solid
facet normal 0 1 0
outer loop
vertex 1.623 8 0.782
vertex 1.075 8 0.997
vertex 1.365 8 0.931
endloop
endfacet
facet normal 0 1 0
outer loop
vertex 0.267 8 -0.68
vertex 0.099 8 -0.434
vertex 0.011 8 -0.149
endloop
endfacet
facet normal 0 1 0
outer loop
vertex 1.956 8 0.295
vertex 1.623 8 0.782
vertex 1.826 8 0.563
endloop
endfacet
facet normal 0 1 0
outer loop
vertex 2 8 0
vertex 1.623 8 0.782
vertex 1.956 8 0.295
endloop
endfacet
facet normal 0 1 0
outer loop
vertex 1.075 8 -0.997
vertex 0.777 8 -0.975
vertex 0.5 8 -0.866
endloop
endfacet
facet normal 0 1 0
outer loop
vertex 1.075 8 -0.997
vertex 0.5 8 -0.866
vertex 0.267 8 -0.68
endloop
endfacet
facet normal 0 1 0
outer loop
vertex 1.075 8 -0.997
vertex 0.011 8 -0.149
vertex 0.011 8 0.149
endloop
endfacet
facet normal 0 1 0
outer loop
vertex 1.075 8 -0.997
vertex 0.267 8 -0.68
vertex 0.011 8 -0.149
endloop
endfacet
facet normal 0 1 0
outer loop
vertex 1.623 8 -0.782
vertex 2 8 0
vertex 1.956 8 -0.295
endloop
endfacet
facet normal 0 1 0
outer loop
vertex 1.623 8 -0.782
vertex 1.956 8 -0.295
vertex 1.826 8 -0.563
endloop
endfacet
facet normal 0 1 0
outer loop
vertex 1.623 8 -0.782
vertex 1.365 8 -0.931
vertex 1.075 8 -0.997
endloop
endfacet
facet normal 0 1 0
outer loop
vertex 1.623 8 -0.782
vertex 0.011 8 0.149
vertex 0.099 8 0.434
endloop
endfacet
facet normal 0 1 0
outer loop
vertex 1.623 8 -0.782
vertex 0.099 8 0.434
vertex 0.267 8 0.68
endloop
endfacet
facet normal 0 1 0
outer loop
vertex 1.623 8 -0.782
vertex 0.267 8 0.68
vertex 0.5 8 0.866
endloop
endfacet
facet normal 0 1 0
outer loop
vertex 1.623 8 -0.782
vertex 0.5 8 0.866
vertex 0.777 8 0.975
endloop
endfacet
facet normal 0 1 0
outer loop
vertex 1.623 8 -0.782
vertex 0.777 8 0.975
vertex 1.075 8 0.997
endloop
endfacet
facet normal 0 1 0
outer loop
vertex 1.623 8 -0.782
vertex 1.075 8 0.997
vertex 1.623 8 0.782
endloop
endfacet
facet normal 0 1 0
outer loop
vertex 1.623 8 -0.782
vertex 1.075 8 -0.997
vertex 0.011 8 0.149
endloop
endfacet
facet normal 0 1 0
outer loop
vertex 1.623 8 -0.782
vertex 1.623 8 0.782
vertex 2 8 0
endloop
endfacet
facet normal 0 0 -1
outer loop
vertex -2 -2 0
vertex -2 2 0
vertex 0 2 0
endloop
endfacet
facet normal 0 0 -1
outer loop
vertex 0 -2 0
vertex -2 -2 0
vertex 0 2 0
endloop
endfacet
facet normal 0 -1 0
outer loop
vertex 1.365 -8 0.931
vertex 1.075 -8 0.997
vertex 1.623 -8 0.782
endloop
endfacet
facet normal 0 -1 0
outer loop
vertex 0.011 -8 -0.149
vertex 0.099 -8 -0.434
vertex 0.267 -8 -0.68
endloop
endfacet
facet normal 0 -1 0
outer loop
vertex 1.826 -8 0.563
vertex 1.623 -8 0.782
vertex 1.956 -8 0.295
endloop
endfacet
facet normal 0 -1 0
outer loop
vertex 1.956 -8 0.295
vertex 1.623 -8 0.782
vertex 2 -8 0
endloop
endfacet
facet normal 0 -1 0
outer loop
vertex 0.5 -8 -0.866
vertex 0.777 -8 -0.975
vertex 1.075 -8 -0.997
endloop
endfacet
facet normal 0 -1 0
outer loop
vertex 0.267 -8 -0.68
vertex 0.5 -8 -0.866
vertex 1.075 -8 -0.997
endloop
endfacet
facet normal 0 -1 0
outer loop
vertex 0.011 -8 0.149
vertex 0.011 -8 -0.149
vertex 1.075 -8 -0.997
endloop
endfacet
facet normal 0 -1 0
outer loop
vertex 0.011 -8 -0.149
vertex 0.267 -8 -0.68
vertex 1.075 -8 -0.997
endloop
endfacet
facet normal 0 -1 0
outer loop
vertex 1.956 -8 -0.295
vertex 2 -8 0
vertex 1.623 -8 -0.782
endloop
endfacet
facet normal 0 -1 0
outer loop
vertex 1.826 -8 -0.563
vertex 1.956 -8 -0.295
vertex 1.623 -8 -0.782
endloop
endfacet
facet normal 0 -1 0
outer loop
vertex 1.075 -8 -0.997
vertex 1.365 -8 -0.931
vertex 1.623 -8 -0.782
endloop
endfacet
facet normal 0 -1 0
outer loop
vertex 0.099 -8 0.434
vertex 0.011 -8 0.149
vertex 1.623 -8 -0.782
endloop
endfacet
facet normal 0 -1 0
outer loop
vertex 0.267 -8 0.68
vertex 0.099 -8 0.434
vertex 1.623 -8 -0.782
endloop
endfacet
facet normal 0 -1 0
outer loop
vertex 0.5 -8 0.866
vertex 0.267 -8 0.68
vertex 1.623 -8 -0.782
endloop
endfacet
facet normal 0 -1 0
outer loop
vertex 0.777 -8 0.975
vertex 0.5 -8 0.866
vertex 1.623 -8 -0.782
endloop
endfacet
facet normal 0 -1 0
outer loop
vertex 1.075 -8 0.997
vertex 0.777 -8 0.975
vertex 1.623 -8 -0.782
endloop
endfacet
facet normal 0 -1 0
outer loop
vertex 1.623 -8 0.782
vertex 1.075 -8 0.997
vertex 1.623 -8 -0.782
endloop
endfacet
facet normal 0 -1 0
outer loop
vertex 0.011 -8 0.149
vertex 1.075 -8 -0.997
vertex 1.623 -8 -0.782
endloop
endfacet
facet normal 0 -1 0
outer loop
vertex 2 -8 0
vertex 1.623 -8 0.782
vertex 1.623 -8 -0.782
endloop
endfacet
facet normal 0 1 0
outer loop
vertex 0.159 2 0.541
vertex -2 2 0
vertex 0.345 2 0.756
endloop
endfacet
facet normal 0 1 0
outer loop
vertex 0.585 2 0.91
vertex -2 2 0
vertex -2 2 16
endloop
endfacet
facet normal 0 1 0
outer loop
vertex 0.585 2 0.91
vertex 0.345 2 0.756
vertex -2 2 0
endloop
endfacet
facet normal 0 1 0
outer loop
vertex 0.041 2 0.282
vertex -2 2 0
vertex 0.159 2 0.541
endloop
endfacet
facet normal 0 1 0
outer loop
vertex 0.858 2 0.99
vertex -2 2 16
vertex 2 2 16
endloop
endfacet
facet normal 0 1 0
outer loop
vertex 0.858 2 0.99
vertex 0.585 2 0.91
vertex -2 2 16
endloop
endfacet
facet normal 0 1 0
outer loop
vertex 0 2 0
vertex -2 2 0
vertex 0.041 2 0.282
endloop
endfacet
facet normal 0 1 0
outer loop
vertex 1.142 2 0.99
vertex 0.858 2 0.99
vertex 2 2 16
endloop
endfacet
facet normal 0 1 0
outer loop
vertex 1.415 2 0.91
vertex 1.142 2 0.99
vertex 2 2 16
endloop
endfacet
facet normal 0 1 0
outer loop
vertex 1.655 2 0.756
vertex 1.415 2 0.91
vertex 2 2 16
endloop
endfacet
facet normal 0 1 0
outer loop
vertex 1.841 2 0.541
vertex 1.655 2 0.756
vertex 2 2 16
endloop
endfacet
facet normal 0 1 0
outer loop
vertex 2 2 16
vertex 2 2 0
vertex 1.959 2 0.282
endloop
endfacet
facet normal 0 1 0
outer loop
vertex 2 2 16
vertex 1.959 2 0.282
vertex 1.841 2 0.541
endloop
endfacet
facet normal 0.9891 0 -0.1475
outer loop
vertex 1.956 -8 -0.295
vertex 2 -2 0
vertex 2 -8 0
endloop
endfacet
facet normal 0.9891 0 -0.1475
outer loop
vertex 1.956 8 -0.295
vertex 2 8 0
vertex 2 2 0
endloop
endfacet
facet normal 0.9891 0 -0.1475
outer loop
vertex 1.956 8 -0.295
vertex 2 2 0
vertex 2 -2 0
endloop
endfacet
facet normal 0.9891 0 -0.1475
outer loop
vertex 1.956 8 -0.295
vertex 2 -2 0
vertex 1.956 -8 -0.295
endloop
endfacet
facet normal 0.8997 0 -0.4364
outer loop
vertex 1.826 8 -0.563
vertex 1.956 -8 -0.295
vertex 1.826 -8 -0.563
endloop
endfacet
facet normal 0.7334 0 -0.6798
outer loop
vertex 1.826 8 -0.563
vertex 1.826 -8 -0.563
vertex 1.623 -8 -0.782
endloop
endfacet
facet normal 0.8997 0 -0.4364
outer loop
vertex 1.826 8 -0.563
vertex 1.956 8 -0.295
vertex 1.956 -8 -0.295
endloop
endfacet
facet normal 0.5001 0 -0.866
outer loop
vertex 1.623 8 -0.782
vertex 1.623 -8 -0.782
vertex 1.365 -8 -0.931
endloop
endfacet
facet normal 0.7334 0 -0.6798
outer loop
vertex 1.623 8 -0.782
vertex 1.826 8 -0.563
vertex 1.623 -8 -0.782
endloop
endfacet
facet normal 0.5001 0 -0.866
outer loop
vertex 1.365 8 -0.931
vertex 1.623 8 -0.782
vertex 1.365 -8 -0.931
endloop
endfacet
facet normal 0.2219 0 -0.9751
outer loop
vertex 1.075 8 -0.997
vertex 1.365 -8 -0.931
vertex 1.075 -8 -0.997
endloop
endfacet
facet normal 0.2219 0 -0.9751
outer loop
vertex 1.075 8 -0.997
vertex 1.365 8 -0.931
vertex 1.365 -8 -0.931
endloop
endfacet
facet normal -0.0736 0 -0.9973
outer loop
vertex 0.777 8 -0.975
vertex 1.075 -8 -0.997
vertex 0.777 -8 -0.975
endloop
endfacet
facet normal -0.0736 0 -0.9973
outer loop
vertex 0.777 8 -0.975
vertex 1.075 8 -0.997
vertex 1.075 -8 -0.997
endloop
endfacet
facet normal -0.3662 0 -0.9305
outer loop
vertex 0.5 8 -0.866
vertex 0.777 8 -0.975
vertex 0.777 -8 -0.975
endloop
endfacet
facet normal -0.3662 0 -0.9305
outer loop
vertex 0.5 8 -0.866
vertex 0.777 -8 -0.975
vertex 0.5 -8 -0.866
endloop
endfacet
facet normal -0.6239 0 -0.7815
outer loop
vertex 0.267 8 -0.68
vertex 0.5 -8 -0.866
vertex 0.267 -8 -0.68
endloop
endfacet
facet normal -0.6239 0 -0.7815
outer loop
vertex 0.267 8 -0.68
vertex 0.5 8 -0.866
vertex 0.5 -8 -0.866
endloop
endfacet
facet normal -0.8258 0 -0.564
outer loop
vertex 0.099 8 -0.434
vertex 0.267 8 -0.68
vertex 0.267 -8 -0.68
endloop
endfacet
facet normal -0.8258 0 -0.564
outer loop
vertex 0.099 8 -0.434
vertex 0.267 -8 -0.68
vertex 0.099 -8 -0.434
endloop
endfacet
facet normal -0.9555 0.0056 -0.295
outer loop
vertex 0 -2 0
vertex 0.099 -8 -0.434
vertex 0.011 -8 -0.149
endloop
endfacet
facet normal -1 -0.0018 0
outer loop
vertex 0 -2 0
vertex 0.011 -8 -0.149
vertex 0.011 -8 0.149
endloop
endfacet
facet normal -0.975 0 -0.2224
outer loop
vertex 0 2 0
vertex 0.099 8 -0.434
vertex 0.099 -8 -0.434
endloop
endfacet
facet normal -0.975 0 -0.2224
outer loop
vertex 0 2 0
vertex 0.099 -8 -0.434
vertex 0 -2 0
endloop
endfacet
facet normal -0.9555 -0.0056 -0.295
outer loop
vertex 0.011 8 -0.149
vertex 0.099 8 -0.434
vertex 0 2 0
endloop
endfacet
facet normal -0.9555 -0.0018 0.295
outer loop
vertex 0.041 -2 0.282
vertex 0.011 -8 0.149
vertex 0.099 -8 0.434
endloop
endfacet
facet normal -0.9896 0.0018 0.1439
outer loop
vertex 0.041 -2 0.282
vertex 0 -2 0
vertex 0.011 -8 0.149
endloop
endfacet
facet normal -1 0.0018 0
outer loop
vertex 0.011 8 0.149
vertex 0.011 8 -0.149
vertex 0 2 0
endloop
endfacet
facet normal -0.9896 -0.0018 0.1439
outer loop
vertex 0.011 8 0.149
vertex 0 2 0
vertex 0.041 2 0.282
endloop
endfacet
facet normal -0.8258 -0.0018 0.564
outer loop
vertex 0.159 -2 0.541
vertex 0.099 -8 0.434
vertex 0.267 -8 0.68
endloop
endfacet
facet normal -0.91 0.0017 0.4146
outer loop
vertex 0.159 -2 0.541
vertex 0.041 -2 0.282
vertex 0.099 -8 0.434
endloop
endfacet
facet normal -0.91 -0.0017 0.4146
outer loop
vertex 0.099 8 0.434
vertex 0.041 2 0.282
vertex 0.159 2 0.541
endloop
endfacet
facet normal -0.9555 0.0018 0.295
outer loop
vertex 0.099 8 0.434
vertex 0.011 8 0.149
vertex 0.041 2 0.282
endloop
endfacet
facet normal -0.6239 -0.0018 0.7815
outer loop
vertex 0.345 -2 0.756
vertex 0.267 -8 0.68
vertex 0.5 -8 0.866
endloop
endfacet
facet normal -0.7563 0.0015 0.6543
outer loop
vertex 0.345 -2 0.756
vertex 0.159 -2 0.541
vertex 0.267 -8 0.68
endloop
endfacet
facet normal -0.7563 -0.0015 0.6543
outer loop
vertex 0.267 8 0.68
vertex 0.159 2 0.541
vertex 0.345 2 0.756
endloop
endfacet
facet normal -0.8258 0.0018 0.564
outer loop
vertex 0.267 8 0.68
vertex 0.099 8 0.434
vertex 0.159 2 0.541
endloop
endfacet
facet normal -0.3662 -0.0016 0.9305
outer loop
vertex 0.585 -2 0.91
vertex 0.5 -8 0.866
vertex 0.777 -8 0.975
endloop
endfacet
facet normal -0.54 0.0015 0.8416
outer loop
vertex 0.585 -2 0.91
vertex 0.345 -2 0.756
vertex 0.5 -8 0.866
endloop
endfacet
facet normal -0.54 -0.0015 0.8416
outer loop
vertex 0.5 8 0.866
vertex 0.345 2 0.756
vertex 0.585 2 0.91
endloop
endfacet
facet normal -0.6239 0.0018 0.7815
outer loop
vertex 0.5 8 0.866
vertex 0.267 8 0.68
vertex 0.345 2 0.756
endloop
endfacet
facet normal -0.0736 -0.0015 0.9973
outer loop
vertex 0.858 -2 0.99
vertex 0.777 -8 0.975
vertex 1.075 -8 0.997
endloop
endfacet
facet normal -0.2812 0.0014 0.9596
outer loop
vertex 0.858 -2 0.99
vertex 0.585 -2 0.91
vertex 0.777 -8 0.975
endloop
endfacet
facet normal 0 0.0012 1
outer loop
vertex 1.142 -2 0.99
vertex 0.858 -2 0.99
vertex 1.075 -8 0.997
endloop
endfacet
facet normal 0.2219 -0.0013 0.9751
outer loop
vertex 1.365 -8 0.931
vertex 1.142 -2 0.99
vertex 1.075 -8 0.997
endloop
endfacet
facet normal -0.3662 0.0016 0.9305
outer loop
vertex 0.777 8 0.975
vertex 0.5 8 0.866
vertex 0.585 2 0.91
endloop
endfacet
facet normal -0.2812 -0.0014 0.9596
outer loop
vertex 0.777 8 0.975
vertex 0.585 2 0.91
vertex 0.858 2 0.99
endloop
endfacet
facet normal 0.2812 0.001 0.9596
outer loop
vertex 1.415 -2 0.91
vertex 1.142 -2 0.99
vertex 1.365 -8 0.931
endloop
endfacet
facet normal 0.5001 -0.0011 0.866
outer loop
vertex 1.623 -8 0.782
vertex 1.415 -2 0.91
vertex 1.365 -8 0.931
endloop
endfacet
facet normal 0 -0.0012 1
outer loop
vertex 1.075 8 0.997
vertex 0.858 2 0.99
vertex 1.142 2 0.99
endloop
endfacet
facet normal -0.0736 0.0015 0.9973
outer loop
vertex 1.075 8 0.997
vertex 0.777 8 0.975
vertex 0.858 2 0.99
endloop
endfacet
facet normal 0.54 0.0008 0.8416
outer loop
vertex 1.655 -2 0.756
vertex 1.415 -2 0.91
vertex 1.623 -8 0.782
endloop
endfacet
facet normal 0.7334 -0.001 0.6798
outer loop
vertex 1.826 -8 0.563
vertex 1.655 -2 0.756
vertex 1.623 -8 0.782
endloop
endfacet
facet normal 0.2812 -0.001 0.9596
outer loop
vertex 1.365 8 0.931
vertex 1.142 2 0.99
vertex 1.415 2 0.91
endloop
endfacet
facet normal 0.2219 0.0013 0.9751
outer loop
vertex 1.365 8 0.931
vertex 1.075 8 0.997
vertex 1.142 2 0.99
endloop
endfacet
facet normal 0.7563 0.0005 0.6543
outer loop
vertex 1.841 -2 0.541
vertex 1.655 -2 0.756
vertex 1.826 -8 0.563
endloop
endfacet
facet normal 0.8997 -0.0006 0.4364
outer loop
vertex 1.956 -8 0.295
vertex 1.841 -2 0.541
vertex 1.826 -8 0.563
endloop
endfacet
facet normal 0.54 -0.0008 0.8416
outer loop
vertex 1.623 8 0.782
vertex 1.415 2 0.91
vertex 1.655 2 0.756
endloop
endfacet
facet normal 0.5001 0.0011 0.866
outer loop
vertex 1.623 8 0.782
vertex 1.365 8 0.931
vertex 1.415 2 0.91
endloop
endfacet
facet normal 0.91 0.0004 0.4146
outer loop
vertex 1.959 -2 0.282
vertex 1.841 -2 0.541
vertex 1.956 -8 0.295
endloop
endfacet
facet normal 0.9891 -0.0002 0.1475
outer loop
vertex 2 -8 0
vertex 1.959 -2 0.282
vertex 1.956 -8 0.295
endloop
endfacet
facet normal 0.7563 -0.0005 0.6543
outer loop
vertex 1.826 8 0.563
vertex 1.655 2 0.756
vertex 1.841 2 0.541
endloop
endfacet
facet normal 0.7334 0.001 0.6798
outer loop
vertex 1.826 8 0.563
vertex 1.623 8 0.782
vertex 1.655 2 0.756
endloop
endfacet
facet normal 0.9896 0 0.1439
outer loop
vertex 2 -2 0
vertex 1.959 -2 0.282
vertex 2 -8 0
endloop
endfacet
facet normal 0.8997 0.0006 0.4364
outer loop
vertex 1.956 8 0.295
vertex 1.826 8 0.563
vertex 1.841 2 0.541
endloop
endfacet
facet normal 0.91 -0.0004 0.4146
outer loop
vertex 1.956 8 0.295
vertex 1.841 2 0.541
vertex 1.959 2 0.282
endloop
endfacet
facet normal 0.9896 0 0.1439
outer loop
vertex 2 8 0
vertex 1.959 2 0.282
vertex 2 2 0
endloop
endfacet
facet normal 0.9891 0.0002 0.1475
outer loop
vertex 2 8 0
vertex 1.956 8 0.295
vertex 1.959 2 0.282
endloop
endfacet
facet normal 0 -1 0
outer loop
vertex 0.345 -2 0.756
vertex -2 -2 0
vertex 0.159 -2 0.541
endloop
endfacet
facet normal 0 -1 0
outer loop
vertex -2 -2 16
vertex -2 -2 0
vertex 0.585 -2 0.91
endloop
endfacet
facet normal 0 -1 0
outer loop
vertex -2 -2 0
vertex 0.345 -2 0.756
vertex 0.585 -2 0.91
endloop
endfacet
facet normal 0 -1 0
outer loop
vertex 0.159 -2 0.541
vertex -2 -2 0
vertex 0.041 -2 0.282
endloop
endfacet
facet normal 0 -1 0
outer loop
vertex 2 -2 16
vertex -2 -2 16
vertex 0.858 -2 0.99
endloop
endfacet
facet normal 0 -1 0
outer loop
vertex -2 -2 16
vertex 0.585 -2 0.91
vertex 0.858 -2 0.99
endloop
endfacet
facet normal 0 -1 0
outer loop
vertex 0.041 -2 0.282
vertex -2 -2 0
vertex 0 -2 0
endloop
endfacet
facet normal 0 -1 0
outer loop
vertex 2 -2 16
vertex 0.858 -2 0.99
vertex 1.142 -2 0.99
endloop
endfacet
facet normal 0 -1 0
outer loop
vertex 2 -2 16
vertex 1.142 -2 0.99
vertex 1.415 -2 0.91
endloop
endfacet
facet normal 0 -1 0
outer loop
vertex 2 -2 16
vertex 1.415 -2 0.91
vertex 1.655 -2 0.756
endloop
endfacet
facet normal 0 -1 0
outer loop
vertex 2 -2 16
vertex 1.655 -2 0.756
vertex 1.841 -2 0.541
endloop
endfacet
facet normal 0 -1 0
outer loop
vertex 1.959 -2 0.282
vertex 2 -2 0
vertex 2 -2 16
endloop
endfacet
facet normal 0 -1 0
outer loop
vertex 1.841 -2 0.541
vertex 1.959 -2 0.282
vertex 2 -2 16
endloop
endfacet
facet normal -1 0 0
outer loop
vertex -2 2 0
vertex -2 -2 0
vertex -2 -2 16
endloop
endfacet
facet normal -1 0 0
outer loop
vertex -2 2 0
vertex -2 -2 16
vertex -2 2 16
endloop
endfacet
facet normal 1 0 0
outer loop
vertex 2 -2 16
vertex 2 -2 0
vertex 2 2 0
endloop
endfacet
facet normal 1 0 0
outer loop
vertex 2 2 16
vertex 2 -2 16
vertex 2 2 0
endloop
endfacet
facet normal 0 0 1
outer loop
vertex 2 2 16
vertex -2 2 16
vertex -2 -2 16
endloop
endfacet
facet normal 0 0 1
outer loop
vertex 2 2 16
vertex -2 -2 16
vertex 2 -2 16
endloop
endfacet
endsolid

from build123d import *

# Parameters (mm, degrees)
SKETCH_1_W      = 4
SKETCH_1_H      = 4
EXTRUDE_1_DEPTH = 16
SKETCH_3_R      = 1
EXTRUDE_2_DEPTH = 8


with BuildPart() as part:
    # 草图1 → 凸台-拉伸1 (new body)
    with BuildSketch(Plane.XY):
        Rectangle(SKETCH_1_W, SKETCH_1_H)
    extrude(amount=EXTRUDE_1_DEPTH)

    # 草图3 → 凸台-拉伸2 (add, symmetric)
    with BuildSketch(Plane(origin=(0, 0, 0), x_dir=(1, 0, 0), z_dir=(0, 1, 0))):
        with Locations((1, 0)):
            Circle(SKETCH_3_R)
    extrude(amount=EXTRUDE_2_DEPTH, both=True)


solid = part.part
